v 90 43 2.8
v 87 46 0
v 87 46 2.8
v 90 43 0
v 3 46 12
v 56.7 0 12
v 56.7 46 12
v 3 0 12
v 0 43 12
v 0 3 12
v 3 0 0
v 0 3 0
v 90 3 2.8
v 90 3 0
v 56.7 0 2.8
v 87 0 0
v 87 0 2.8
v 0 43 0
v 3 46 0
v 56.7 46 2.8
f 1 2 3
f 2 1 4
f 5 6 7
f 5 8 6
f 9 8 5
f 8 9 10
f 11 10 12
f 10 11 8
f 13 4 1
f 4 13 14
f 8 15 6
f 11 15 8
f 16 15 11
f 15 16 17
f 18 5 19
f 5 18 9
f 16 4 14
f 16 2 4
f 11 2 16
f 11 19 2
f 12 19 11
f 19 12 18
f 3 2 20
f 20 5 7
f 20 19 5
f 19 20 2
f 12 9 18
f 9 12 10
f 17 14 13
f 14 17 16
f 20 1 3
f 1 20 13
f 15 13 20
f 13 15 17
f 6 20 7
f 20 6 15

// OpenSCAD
$fn = 32;

// ----------------------------------------------------------------------
// Stepped bar: endstep, 90 x 46 x 12/2.8 mm
// ----------------------------------------------------------------------

// --- parameters (mm) ---
bar_l = 90;               // bar length, X
bar_w = 46;               // bar width, Y
plate_t = 12;             // thickness of the thick zone, Z
thin_t = 2.8;             // thickness of the thin zone
corner_c = 3;             // corner chamfer of the bar
step_cut = 9.2;           // material removed from the thin zone
step_x = 56.7;            // step position from the left end
depth_1 = 9.2;            // depth of cut 1 from the top face

profile = [[3, 0], [87, 0], [90, 3], [90, 43], [87, 46], [3, 46], [0, 43], [0, 3]];  // primary outline, 8 points, counter clockwise
void_1 = [[56.7, -1], [91, -1], [91, 47], [56.7, 47]];  // thin zone beyond the step, 4 points

// --- the one profile operation ---
difference() {
  linear_extrude(height = plate_t) polygon(points = profile);
  translate([0, 0, plate_t - depth_1])
    linear_extrude(height = depth_1 + 1) polygon(points = void_1);
}
